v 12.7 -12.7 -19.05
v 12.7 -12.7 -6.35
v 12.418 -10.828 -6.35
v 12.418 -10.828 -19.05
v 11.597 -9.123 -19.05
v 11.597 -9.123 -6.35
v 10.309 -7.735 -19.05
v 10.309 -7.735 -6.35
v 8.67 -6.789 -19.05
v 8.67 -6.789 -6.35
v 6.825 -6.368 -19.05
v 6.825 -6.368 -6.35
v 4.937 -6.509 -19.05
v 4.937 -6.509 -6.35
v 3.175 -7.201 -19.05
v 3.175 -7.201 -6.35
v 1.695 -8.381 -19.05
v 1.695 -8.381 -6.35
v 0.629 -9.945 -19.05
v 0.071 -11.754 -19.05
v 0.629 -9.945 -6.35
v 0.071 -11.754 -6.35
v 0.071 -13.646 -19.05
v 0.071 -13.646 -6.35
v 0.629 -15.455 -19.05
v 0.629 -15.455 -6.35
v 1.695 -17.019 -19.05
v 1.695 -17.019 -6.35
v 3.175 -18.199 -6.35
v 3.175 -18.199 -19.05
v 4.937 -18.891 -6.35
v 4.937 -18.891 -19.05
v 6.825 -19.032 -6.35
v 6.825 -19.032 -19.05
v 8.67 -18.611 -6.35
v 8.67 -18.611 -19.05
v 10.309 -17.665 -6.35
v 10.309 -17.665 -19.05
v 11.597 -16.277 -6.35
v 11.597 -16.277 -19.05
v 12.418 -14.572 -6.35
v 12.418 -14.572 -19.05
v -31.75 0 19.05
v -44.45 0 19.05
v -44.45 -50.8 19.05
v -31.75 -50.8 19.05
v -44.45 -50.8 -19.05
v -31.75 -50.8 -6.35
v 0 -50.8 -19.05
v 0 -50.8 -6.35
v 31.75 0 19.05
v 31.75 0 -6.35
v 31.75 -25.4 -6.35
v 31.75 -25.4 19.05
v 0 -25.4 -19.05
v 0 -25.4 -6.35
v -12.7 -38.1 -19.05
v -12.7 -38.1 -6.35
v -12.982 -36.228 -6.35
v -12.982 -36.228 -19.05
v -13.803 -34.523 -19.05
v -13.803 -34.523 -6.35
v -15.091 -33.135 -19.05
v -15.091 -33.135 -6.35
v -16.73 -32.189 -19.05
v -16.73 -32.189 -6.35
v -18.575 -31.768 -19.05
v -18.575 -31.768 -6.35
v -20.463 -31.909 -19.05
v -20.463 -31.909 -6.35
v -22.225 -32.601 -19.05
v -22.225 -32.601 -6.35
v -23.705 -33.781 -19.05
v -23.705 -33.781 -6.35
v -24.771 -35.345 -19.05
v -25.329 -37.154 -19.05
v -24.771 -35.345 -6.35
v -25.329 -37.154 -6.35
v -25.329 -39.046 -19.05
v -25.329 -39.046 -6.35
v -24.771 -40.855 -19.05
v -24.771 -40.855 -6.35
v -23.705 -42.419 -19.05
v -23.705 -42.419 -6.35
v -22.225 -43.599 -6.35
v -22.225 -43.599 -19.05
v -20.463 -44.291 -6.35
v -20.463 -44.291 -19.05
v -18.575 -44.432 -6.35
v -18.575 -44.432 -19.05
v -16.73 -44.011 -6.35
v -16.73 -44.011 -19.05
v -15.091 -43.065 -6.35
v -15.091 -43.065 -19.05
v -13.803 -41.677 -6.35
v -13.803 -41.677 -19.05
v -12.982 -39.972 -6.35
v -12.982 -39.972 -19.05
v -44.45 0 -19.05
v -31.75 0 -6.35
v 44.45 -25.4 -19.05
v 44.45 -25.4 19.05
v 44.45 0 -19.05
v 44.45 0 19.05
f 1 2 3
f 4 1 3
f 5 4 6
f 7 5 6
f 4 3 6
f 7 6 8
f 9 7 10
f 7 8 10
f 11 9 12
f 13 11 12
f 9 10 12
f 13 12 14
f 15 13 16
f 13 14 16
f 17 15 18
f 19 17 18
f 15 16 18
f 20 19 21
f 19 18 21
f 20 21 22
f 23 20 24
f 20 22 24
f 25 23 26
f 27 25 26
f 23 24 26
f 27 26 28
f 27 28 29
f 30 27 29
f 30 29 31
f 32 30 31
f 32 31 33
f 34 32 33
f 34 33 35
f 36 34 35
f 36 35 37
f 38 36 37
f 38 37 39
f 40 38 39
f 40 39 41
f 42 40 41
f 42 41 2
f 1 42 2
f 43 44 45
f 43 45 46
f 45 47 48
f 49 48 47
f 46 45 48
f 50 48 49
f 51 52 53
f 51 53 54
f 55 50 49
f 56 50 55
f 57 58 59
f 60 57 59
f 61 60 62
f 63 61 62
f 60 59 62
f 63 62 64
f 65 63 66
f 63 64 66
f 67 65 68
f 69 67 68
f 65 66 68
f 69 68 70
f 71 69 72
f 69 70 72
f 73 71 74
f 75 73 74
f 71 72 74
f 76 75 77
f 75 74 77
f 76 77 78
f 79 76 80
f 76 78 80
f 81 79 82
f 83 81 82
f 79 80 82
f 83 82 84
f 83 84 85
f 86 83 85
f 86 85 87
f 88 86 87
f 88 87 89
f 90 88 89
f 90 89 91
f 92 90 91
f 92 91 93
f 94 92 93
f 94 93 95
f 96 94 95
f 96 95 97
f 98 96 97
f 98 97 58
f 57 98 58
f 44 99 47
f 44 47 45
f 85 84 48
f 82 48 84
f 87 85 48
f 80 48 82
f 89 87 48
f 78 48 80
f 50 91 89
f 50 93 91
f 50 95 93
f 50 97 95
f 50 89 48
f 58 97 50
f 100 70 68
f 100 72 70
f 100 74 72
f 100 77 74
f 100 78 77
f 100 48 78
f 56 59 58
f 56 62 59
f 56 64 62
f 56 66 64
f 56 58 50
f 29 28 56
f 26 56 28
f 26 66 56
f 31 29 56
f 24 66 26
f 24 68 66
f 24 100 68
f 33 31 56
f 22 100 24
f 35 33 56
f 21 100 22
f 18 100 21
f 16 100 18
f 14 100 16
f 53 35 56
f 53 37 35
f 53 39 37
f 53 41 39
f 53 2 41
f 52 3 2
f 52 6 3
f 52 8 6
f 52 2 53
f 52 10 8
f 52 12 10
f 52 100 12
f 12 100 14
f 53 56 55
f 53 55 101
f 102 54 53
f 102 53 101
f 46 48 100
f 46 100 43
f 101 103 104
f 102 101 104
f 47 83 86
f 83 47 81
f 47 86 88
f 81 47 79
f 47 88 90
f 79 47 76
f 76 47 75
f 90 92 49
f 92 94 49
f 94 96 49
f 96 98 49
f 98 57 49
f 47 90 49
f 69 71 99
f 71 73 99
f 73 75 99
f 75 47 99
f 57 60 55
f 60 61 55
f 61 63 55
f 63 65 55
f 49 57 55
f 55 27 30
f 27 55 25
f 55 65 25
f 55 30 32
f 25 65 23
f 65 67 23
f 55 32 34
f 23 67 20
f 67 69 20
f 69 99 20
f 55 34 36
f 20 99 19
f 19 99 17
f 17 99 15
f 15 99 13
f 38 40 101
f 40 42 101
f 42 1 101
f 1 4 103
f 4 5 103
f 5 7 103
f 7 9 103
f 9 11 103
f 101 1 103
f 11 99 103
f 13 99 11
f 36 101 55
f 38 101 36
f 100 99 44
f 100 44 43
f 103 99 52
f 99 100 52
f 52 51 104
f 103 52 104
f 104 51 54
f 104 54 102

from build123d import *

# Parameters (mm, degrees)
F0_W     = 88.9
F0_H     = 38.1
F2_DEPTH = 50.8
F1_W     = 63.5
F1_H     = 25.4
F3_DEPTH = 50.801
F4_W     = 44.45
F4_H     = 25.4
F5_DEPTH = 38.101
F6_R     = 6.35
F7_DEPTH = 12.701


with BuildPart() as f2:
    # F0 (on Front) → F2 (new body)
    with BuildSketch(Plane.XZ):
        Rectangle(F0_W, F0_H)
    extrude(amount=F2_DEPTH)

    # F1 (on face) → F3 (cut, through all)
    with BuildSketch(Plane.XZ):
        with Locations((0, 6.35)):
            Rectangle(F1_W, F1_H)
    extrude(amount=F3_DEPTH, mode=Mode.SUBTRACT)

    # F4 (on face) → F5 (cut, through all)
    with BuildSketch(Plane.XY.offset(19.05)):
        with Locations((22.225, -38.1)):
            Rectangle(F4_W, F4_H)
    extrude(amount=-F5_DEPTH, mode=Mode.SUBTRACT)

    # F6 (on face) → F7 (cut, through all)
    with BuildSketch(Plane.XY.offset(-6.35)):
        with Locations((-19.05, -38.1)):
            Circle(F6_R)
        with Locations((6.35, -12.7)):
            Circle(F6_R)
    extrude(amount=-F7_DEPTH, mode=Mode.SUBTRACT)


solid = f2.part
